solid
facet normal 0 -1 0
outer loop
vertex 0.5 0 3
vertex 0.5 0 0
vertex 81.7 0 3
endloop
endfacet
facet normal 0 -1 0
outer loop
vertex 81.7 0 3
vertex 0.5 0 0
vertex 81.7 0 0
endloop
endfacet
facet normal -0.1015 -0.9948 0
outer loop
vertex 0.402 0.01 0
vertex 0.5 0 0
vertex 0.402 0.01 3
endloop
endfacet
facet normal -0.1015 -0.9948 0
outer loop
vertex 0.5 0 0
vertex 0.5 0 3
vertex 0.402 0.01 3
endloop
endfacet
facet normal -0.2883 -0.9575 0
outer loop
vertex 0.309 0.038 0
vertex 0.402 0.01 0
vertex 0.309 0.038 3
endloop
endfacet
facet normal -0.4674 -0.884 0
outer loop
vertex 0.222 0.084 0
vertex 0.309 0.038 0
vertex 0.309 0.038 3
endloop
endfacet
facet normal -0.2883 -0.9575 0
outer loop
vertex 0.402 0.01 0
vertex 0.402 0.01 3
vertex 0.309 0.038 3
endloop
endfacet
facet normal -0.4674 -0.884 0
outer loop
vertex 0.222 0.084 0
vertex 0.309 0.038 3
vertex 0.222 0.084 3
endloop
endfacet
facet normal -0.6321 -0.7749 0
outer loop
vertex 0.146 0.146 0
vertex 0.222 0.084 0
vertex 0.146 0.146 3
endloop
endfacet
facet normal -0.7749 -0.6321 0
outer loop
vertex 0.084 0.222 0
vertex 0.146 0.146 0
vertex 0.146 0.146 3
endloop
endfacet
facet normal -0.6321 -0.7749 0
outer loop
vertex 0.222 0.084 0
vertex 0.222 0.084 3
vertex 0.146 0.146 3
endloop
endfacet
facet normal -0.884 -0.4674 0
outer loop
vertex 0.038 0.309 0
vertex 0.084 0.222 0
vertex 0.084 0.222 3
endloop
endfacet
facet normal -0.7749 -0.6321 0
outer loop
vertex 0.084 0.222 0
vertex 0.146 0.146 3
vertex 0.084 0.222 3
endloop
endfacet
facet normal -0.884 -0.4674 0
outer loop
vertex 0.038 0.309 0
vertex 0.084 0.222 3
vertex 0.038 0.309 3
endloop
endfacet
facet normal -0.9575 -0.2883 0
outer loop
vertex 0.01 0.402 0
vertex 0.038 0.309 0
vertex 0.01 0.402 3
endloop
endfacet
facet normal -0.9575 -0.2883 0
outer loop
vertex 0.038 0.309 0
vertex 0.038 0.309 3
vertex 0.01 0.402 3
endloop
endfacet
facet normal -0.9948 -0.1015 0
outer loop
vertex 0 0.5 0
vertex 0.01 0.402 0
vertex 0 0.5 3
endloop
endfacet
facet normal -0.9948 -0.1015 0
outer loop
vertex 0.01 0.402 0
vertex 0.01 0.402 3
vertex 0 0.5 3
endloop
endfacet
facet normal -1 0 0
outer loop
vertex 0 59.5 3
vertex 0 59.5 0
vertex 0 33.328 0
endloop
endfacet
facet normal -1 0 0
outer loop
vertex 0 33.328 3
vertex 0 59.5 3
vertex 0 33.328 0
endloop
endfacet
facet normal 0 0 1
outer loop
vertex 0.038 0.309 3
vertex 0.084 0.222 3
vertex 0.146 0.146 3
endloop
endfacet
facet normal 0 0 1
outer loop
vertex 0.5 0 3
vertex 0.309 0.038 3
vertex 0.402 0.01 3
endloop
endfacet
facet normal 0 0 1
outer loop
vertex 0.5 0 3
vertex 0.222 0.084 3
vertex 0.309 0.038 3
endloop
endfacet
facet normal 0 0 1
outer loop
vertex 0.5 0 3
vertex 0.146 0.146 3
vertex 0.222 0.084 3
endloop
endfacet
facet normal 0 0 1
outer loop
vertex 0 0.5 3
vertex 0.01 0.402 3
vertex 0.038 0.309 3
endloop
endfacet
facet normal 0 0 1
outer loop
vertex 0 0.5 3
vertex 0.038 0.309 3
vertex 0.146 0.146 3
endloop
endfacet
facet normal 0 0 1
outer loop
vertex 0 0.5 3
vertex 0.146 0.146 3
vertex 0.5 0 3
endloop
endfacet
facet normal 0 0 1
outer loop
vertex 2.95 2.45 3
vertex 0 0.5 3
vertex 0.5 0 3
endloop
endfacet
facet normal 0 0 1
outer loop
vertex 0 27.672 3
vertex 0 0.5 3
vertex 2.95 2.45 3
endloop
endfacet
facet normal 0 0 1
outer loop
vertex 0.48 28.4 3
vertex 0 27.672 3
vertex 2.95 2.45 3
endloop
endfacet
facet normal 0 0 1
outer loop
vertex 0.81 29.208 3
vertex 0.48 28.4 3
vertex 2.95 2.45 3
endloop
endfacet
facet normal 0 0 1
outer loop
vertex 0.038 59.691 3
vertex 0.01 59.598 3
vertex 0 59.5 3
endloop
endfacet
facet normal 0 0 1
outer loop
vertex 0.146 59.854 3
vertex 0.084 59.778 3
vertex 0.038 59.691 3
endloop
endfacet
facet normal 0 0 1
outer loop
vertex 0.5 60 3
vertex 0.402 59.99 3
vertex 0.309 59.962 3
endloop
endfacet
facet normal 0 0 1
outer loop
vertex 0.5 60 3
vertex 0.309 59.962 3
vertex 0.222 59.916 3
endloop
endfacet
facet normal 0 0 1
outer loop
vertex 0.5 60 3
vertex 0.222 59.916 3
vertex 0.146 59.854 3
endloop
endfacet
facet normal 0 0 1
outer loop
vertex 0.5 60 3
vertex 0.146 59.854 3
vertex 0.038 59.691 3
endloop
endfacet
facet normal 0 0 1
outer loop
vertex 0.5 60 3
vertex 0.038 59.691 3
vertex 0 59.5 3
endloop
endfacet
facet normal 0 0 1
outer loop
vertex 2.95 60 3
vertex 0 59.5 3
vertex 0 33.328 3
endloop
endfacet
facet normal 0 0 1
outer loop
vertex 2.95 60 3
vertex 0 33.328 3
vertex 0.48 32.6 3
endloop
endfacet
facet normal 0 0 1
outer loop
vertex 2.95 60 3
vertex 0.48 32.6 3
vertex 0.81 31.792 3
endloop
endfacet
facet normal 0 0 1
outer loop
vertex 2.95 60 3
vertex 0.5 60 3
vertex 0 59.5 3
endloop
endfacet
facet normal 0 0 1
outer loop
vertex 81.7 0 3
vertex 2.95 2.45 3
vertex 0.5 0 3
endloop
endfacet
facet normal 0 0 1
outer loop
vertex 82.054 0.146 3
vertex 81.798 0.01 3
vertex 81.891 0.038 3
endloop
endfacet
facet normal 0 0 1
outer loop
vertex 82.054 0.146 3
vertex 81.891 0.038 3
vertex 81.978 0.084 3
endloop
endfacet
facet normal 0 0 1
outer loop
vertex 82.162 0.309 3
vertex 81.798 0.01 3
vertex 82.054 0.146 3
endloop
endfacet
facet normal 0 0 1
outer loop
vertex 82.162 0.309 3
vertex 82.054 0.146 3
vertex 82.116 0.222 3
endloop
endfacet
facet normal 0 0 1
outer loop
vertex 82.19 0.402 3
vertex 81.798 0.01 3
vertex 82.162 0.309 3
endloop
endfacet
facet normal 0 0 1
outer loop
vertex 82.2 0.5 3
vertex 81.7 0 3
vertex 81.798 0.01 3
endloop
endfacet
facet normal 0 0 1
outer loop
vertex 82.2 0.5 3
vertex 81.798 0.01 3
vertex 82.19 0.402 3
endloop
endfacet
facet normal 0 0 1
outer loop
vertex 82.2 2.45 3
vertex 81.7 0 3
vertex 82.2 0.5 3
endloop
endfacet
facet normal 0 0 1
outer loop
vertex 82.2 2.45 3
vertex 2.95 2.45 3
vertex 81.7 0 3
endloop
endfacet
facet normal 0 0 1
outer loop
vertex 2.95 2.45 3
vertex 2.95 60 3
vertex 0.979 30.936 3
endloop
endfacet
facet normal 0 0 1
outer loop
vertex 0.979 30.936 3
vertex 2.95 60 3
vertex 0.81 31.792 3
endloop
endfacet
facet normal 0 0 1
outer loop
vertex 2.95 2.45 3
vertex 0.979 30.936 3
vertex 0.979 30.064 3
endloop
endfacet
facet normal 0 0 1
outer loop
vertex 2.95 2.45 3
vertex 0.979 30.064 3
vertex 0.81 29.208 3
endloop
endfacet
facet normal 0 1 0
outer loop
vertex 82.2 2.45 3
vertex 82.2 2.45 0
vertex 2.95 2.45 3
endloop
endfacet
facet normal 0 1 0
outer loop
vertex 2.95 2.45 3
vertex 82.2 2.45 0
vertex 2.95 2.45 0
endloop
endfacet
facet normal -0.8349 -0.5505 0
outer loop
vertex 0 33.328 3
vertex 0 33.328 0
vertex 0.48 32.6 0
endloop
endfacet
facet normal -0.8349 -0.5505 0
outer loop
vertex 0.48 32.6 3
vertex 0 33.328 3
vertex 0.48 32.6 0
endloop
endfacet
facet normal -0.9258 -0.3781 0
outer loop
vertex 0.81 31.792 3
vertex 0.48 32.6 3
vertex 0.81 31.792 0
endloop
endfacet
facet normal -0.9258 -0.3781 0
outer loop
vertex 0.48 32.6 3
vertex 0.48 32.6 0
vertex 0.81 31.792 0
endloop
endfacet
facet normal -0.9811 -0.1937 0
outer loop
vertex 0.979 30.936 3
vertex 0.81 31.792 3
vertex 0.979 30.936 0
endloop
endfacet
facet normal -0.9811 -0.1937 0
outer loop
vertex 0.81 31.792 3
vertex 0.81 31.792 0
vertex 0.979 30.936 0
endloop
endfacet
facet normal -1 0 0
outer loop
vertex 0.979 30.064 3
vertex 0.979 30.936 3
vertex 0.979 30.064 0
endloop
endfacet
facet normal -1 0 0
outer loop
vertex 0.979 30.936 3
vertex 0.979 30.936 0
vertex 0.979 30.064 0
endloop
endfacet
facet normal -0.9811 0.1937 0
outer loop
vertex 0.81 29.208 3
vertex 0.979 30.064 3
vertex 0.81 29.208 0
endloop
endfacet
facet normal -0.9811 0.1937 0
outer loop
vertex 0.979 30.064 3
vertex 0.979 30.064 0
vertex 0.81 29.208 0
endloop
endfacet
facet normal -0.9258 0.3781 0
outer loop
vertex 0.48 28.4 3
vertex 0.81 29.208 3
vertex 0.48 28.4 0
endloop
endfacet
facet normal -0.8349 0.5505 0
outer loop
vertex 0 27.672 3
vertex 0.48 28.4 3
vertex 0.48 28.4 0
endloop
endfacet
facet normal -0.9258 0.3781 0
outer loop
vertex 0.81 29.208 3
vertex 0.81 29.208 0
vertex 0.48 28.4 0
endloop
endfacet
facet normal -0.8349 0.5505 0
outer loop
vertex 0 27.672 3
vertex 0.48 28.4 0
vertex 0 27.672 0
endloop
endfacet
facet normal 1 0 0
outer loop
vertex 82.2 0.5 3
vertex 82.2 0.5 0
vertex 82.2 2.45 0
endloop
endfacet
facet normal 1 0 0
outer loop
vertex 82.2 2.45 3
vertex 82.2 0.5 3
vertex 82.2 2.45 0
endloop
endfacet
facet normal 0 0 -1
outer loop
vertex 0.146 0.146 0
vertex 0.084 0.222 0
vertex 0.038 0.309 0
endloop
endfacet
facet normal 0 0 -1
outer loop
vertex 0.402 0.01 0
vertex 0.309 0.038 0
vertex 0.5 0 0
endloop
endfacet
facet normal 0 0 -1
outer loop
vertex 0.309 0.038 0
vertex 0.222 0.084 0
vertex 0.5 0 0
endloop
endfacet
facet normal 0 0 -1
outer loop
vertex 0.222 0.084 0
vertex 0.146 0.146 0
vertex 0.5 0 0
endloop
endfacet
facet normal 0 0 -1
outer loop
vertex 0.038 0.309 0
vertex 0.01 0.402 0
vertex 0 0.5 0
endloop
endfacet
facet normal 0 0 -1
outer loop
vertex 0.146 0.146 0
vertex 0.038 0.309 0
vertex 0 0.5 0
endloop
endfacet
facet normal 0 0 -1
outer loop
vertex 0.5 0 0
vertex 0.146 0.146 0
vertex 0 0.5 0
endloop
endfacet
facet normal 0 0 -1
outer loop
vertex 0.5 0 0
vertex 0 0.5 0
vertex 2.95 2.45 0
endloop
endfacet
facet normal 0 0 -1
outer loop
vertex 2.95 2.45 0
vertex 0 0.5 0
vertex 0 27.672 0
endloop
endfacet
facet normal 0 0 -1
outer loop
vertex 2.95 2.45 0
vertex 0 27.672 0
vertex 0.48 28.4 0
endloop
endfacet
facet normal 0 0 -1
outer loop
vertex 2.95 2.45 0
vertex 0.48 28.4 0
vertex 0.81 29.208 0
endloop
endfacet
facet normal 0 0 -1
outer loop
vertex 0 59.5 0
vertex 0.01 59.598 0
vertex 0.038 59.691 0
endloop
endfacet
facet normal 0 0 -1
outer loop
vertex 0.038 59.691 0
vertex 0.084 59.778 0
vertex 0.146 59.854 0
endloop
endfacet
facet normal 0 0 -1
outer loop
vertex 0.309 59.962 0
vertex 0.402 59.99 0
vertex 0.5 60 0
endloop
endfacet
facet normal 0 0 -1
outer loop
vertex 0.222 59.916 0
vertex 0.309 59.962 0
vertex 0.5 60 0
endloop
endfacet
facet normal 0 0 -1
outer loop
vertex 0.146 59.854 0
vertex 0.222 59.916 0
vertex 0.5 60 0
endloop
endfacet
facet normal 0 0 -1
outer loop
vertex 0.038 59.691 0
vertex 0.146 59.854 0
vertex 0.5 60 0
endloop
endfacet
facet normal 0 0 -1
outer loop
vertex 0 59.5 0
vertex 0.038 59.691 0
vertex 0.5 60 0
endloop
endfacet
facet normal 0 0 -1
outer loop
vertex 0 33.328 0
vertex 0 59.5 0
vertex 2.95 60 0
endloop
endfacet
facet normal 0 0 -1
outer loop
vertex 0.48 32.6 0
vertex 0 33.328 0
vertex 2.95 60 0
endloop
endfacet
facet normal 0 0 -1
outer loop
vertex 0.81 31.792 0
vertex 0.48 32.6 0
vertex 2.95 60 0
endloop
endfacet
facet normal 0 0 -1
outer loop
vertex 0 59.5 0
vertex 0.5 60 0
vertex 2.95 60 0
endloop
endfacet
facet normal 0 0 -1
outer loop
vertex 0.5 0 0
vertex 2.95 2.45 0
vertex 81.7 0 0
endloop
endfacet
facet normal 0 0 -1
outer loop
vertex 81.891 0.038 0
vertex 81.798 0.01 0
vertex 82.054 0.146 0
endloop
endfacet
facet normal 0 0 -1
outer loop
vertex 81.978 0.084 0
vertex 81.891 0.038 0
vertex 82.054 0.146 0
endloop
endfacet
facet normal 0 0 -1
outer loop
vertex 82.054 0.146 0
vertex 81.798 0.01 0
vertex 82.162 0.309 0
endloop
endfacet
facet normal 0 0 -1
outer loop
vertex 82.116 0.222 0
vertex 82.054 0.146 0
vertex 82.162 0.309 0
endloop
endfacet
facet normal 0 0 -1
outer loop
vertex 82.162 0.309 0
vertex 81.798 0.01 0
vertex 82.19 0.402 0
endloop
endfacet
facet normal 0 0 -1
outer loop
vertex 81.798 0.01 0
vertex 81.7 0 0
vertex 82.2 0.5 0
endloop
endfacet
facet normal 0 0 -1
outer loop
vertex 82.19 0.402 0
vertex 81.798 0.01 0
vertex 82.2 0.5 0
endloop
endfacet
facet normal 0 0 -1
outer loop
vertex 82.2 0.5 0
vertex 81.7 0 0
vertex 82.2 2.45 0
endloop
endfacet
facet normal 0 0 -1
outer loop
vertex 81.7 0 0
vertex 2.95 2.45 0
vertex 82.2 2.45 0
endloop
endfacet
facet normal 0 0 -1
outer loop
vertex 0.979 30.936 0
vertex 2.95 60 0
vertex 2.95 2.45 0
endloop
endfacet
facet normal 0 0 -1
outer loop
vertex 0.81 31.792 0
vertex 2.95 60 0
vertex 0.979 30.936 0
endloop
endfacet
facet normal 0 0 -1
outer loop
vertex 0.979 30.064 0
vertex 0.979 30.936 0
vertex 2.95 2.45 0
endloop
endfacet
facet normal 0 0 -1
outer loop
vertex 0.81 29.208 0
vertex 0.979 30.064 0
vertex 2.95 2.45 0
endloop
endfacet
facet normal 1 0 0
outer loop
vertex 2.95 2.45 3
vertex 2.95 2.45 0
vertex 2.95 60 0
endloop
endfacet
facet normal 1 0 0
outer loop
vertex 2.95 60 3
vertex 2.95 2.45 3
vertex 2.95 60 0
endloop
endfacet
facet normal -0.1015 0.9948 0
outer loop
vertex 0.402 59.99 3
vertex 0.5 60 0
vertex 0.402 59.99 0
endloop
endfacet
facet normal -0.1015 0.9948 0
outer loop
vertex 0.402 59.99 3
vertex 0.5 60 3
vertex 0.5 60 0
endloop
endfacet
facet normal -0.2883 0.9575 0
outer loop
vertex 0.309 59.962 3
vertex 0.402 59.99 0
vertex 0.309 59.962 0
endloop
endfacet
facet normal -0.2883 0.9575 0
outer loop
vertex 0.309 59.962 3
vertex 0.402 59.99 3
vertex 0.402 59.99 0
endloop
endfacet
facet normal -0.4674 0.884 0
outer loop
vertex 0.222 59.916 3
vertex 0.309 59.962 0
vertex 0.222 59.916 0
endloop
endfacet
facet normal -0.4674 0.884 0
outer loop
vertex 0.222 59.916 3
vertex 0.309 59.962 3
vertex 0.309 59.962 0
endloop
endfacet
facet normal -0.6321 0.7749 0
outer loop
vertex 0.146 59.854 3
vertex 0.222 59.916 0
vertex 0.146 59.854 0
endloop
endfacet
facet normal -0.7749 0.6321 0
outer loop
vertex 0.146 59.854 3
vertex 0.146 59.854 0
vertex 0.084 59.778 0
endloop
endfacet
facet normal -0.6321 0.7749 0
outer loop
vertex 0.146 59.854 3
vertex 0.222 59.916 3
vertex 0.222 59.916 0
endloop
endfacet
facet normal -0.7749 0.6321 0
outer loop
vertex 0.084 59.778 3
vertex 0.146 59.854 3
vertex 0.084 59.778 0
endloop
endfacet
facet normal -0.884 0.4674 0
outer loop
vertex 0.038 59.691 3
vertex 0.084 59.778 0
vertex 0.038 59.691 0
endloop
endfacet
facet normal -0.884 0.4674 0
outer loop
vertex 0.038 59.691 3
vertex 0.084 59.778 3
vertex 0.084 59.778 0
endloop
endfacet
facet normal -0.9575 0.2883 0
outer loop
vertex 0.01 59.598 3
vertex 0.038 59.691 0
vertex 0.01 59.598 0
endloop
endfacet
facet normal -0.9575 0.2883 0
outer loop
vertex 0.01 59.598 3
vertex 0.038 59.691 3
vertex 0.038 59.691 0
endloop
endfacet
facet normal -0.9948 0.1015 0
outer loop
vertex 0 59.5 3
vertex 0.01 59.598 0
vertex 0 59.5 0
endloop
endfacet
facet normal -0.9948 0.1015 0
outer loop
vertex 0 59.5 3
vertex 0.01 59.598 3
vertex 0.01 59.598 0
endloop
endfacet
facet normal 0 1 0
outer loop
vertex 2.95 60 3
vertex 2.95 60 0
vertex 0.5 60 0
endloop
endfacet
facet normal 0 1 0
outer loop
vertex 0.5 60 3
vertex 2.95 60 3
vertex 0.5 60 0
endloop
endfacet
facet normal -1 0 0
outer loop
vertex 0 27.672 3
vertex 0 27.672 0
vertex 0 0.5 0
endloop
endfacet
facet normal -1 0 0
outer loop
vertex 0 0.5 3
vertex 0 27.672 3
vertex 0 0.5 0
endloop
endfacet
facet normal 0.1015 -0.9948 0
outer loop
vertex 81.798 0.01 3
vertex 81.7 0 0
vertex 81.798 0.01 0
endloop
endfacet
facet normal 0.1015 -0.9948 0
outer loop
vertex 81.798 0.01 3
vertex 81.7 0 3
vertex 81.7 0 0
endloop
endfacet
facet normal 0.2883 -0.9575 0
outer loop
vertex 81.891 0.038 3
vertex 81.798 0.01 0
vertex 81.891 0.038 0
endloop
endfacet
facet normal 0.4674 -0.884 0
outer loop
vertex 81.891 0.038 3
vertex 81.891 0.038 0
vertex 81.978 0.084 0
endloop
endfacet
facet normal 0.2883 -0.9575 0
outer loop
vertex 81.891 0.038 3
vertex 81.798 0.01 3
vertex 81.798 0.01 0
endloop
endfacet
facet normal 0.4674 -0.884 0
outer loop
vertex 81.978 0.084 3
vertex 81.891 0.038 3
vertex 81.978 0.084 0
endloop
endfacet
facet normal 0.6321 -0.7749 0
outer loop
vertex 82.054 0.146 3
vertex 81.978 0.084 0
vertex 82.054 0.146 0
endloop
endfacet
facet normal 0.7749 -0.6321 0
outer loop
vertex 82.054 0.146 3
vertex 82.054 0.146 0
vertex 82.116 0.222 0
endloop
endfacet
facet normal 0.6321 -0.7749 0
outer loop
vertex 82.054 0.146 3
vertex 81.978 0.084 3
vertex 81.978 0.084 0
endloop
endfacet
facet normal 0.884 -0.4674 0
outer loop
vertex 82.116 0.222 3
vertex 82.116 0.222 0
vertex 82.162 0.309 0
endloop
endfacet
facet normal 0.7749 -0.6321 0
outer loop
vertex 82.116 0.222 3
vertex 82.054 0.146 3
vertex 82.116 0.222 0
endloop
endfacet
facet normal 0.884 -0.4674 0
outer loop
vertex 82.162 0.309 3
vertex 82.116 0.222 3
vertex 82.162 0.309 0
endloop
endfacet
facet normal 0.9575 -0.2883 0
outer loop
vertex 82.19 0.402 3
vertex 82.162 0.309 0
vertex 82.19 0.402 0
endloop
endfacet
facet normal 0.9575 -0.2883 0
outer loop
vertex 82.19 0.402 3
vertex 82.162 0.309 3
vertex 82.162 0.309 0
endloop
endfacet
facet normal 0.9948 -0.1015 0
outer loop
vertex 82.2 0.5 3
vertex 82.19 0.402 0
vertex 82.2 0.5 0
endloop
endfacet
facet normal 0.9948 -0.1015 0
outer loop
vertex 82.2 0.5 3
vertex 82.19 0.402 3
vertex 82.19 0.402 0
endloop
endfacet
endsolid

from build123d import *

# Parameters (mm, degrees)
SALIENTE_EXTRUIR1_DEPTH = 3
REDONDEO1_R             = 0.5


with BuildPart() as part:
    # Croquis1 → Saliente-Extruir1 (new body)
    with BuildSketch(Plane.XY):
        with BuildLine():
            Line((0, 0), (82.2, 0))
            Line((82.2, 0), (82.2, 2.45))
            Line((82.2, 2.45), (2.95, 2.45))
            Line((2.95, 2.45), (2.95, 60))
            Line((2.95, 60), (0, 60))
            Line((0, 60), (0, 33.328427125))
            ThreePointArc((0, 33.328427125), (1, 30.5), (0, 27.671572875))
            Line((0, 27.671572875), (0, 0))
        make_face()
    extrude(amount=SALIENTE_EXTRUIR1_DEPTH)

    # Redondeo1
    redondeo1_edges = [part.edges().sort_by_distance(p)[0] for p in [
        (0, 60, 1.5),
        (82.2, 0, 1.5),
        (0, 0, 1.5),
    ]]
    fillet(redondeo1_edges, radius=REDONDEO1_R)


solid = part.part
